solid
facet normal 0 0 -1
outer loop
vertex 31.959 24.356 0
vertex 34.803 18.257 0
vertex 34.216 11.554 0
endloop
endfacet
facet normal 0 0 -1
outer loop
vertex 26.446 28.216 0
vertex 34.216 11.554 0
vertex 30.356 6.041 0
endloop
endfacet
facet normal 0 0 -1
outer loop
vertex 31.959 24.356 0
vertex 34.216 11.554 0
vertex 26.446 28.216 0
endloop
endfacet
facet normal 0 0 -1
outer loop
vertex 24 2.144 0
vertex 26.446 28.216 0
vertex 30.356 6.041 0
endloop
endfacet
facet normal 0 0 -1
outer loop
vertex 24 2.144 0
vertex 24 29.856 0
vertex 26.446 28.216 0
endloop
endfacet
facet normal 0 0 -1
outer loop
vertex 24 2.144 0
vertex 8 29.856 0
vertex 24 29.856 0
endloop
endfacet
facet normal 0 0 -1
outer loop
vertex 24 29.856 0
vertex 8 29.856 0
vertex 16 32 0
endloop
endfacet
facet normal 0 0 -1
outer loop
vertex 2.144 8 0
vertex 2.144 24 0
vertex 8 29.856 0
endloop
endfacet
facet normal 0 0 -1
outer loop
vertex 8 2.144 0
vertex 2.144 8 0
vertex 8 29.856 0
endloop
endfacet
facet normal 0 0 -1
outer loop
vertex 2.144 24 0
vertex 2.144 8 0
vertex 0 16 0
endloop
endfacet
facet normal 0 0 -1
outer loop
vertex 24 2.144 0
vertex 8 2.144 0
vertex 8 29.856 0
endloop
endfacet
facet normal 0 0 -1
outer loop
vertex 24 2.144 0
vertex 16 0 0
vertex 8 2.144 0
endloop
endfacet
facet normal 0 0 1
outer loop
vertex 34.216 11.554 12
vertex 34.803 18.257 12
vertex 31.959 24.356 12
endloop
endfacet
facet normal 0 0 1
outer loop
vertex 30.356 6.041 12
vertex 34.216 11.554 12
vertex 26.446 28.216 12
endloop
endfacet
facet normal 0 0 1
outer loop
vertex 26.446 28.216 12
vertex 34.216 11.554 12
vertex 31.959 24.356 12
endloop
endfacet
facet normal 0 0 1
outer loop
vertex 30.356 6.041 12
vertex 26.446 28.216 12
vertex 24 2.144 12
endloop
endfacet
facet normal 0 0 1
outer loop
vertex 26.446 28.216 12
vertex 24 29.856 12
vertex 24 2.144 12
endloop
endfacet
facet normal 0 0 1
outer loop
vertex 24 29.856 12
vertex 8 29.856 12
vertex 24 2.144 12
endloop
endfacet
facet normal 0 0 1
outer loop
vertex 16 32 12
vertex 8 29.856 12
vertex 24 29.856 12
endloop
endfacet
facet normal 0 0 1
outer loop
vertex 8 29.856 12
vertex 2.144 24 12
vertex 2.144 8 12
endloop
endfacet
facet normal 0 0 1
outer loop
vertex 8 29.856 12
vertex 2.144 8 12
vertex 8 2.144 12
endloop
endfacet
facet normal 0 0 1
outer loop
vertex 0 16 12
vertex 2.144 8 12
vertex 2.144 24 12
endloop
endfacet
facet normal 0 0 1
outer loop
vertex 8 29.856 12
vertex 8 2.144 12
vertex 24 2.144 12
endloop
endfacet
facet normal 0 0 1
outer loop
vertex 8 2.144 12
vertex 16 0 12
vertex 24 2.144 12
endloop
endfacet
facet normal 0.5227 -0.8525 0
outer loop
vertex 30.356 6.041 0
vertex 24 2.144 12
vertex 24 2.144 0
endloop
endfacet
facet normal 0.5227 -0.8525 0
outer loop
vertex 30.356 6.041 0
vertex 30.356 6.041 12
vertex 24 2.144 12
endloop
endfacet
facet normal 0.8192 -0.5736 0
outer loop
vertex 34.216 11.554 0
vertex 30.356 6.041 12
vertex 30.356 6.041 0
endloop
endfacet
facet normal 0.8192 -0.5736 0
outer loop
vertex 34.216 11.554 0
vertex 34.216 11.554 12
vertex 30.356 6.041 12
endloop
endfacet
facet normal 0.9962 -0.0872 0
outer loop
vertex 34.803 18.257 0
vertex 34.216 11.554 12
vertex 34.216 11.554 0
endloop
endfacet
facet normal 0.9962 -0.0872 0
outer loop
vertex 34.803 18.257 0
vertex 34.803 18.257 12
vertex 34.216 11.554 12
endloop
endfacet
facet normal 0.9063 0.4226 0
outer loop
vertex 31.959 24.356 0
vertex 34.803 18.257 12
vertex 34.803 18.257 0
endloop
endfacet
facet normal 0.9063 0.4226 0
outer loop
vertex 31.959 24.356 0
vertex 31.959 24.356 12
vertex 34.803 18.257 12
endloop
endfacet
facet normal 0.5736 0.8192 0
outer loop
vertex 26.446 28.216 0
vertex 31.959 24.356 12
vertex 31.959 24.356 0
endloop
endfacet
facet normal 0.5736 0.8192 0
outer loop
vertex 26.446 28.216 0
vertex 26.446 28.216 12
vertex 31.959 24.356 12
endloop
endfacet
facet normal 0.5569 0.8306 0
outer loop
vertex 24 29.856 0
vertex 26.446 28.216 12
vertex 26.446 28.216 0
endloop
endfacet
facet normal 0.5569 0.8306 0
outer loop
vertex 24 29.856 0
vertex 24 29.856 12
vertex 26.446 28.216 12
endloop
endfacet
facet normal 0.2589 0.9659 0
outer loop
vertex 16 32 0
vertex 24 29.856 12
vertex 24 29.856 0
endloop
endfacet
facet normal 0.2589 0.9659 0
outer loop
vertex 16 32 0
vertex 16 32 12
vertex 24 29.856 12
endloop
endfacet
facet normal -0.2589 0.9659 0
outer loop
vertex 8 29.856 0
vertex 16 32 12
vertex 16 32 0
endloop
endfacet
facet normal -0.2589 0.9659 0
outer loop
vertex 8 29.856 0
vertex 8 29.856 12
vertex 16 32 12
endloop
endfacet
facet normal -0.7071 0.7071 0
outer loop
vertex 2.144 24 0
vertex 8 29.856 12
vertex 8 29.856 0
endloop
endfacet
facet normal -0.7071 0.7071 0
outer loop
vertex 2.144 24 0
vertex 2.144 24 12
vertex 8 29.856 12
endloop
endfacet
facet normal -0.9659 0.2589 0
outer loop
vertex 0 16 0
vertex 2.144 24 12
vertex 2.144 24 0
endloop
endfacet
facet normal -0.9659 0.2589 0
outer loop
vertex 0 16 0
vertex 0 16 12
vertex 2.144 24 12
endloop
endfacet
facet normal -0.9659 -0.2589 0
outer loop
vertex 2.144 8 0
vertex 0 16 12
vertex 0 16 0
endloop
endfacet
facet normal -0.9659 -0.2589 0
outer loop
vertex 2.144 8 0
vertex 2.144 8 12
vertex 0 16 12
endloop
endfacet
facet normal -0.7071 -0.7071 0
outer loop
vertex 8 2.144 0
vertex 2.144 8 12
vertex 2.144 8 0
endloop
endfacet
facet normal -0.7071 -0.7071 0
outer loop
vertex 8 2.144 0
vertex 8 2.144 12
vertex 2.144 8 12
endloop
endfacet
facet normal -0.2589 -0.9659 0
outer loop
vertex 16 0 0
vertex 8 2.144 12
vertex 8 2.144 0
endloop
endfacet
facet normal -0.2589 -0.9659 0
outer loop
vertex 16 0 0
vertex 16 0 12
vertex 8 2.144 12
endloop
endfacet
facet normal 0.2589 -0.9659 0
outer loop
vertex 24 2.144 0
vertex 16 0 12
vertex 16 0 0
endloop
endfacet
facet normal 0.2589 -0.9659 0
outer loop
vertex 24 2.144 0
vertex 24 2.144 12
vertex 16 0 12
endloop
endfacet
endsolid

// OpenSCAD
$fn = 32;

// ----------------------------------------------------------------------
// Eccentric disc: egg, 12 mm thick
// ----------------------------------------------------------------------

// --- parameters (mm) ---
profile_height = 12;      // extrusion height
profile_points = 14;      // points of the closed outline

profile = [[0, 16], [2.144, 8], [8, 2.144], [16, 0], [24, 2.144], [30.356, 6.041], [34.216, 11.554], [34.803, 18.257], [31.959, 24.356], [26.446, 28.216], [24, 29.856], [16, 32], [8, 29.856], [2.144, 24]];  // single closed polygon, 14 points, counter clockwise

// --- the one profile operation ---
linear_extrude(height = profile_height) polygon(points = profile);
